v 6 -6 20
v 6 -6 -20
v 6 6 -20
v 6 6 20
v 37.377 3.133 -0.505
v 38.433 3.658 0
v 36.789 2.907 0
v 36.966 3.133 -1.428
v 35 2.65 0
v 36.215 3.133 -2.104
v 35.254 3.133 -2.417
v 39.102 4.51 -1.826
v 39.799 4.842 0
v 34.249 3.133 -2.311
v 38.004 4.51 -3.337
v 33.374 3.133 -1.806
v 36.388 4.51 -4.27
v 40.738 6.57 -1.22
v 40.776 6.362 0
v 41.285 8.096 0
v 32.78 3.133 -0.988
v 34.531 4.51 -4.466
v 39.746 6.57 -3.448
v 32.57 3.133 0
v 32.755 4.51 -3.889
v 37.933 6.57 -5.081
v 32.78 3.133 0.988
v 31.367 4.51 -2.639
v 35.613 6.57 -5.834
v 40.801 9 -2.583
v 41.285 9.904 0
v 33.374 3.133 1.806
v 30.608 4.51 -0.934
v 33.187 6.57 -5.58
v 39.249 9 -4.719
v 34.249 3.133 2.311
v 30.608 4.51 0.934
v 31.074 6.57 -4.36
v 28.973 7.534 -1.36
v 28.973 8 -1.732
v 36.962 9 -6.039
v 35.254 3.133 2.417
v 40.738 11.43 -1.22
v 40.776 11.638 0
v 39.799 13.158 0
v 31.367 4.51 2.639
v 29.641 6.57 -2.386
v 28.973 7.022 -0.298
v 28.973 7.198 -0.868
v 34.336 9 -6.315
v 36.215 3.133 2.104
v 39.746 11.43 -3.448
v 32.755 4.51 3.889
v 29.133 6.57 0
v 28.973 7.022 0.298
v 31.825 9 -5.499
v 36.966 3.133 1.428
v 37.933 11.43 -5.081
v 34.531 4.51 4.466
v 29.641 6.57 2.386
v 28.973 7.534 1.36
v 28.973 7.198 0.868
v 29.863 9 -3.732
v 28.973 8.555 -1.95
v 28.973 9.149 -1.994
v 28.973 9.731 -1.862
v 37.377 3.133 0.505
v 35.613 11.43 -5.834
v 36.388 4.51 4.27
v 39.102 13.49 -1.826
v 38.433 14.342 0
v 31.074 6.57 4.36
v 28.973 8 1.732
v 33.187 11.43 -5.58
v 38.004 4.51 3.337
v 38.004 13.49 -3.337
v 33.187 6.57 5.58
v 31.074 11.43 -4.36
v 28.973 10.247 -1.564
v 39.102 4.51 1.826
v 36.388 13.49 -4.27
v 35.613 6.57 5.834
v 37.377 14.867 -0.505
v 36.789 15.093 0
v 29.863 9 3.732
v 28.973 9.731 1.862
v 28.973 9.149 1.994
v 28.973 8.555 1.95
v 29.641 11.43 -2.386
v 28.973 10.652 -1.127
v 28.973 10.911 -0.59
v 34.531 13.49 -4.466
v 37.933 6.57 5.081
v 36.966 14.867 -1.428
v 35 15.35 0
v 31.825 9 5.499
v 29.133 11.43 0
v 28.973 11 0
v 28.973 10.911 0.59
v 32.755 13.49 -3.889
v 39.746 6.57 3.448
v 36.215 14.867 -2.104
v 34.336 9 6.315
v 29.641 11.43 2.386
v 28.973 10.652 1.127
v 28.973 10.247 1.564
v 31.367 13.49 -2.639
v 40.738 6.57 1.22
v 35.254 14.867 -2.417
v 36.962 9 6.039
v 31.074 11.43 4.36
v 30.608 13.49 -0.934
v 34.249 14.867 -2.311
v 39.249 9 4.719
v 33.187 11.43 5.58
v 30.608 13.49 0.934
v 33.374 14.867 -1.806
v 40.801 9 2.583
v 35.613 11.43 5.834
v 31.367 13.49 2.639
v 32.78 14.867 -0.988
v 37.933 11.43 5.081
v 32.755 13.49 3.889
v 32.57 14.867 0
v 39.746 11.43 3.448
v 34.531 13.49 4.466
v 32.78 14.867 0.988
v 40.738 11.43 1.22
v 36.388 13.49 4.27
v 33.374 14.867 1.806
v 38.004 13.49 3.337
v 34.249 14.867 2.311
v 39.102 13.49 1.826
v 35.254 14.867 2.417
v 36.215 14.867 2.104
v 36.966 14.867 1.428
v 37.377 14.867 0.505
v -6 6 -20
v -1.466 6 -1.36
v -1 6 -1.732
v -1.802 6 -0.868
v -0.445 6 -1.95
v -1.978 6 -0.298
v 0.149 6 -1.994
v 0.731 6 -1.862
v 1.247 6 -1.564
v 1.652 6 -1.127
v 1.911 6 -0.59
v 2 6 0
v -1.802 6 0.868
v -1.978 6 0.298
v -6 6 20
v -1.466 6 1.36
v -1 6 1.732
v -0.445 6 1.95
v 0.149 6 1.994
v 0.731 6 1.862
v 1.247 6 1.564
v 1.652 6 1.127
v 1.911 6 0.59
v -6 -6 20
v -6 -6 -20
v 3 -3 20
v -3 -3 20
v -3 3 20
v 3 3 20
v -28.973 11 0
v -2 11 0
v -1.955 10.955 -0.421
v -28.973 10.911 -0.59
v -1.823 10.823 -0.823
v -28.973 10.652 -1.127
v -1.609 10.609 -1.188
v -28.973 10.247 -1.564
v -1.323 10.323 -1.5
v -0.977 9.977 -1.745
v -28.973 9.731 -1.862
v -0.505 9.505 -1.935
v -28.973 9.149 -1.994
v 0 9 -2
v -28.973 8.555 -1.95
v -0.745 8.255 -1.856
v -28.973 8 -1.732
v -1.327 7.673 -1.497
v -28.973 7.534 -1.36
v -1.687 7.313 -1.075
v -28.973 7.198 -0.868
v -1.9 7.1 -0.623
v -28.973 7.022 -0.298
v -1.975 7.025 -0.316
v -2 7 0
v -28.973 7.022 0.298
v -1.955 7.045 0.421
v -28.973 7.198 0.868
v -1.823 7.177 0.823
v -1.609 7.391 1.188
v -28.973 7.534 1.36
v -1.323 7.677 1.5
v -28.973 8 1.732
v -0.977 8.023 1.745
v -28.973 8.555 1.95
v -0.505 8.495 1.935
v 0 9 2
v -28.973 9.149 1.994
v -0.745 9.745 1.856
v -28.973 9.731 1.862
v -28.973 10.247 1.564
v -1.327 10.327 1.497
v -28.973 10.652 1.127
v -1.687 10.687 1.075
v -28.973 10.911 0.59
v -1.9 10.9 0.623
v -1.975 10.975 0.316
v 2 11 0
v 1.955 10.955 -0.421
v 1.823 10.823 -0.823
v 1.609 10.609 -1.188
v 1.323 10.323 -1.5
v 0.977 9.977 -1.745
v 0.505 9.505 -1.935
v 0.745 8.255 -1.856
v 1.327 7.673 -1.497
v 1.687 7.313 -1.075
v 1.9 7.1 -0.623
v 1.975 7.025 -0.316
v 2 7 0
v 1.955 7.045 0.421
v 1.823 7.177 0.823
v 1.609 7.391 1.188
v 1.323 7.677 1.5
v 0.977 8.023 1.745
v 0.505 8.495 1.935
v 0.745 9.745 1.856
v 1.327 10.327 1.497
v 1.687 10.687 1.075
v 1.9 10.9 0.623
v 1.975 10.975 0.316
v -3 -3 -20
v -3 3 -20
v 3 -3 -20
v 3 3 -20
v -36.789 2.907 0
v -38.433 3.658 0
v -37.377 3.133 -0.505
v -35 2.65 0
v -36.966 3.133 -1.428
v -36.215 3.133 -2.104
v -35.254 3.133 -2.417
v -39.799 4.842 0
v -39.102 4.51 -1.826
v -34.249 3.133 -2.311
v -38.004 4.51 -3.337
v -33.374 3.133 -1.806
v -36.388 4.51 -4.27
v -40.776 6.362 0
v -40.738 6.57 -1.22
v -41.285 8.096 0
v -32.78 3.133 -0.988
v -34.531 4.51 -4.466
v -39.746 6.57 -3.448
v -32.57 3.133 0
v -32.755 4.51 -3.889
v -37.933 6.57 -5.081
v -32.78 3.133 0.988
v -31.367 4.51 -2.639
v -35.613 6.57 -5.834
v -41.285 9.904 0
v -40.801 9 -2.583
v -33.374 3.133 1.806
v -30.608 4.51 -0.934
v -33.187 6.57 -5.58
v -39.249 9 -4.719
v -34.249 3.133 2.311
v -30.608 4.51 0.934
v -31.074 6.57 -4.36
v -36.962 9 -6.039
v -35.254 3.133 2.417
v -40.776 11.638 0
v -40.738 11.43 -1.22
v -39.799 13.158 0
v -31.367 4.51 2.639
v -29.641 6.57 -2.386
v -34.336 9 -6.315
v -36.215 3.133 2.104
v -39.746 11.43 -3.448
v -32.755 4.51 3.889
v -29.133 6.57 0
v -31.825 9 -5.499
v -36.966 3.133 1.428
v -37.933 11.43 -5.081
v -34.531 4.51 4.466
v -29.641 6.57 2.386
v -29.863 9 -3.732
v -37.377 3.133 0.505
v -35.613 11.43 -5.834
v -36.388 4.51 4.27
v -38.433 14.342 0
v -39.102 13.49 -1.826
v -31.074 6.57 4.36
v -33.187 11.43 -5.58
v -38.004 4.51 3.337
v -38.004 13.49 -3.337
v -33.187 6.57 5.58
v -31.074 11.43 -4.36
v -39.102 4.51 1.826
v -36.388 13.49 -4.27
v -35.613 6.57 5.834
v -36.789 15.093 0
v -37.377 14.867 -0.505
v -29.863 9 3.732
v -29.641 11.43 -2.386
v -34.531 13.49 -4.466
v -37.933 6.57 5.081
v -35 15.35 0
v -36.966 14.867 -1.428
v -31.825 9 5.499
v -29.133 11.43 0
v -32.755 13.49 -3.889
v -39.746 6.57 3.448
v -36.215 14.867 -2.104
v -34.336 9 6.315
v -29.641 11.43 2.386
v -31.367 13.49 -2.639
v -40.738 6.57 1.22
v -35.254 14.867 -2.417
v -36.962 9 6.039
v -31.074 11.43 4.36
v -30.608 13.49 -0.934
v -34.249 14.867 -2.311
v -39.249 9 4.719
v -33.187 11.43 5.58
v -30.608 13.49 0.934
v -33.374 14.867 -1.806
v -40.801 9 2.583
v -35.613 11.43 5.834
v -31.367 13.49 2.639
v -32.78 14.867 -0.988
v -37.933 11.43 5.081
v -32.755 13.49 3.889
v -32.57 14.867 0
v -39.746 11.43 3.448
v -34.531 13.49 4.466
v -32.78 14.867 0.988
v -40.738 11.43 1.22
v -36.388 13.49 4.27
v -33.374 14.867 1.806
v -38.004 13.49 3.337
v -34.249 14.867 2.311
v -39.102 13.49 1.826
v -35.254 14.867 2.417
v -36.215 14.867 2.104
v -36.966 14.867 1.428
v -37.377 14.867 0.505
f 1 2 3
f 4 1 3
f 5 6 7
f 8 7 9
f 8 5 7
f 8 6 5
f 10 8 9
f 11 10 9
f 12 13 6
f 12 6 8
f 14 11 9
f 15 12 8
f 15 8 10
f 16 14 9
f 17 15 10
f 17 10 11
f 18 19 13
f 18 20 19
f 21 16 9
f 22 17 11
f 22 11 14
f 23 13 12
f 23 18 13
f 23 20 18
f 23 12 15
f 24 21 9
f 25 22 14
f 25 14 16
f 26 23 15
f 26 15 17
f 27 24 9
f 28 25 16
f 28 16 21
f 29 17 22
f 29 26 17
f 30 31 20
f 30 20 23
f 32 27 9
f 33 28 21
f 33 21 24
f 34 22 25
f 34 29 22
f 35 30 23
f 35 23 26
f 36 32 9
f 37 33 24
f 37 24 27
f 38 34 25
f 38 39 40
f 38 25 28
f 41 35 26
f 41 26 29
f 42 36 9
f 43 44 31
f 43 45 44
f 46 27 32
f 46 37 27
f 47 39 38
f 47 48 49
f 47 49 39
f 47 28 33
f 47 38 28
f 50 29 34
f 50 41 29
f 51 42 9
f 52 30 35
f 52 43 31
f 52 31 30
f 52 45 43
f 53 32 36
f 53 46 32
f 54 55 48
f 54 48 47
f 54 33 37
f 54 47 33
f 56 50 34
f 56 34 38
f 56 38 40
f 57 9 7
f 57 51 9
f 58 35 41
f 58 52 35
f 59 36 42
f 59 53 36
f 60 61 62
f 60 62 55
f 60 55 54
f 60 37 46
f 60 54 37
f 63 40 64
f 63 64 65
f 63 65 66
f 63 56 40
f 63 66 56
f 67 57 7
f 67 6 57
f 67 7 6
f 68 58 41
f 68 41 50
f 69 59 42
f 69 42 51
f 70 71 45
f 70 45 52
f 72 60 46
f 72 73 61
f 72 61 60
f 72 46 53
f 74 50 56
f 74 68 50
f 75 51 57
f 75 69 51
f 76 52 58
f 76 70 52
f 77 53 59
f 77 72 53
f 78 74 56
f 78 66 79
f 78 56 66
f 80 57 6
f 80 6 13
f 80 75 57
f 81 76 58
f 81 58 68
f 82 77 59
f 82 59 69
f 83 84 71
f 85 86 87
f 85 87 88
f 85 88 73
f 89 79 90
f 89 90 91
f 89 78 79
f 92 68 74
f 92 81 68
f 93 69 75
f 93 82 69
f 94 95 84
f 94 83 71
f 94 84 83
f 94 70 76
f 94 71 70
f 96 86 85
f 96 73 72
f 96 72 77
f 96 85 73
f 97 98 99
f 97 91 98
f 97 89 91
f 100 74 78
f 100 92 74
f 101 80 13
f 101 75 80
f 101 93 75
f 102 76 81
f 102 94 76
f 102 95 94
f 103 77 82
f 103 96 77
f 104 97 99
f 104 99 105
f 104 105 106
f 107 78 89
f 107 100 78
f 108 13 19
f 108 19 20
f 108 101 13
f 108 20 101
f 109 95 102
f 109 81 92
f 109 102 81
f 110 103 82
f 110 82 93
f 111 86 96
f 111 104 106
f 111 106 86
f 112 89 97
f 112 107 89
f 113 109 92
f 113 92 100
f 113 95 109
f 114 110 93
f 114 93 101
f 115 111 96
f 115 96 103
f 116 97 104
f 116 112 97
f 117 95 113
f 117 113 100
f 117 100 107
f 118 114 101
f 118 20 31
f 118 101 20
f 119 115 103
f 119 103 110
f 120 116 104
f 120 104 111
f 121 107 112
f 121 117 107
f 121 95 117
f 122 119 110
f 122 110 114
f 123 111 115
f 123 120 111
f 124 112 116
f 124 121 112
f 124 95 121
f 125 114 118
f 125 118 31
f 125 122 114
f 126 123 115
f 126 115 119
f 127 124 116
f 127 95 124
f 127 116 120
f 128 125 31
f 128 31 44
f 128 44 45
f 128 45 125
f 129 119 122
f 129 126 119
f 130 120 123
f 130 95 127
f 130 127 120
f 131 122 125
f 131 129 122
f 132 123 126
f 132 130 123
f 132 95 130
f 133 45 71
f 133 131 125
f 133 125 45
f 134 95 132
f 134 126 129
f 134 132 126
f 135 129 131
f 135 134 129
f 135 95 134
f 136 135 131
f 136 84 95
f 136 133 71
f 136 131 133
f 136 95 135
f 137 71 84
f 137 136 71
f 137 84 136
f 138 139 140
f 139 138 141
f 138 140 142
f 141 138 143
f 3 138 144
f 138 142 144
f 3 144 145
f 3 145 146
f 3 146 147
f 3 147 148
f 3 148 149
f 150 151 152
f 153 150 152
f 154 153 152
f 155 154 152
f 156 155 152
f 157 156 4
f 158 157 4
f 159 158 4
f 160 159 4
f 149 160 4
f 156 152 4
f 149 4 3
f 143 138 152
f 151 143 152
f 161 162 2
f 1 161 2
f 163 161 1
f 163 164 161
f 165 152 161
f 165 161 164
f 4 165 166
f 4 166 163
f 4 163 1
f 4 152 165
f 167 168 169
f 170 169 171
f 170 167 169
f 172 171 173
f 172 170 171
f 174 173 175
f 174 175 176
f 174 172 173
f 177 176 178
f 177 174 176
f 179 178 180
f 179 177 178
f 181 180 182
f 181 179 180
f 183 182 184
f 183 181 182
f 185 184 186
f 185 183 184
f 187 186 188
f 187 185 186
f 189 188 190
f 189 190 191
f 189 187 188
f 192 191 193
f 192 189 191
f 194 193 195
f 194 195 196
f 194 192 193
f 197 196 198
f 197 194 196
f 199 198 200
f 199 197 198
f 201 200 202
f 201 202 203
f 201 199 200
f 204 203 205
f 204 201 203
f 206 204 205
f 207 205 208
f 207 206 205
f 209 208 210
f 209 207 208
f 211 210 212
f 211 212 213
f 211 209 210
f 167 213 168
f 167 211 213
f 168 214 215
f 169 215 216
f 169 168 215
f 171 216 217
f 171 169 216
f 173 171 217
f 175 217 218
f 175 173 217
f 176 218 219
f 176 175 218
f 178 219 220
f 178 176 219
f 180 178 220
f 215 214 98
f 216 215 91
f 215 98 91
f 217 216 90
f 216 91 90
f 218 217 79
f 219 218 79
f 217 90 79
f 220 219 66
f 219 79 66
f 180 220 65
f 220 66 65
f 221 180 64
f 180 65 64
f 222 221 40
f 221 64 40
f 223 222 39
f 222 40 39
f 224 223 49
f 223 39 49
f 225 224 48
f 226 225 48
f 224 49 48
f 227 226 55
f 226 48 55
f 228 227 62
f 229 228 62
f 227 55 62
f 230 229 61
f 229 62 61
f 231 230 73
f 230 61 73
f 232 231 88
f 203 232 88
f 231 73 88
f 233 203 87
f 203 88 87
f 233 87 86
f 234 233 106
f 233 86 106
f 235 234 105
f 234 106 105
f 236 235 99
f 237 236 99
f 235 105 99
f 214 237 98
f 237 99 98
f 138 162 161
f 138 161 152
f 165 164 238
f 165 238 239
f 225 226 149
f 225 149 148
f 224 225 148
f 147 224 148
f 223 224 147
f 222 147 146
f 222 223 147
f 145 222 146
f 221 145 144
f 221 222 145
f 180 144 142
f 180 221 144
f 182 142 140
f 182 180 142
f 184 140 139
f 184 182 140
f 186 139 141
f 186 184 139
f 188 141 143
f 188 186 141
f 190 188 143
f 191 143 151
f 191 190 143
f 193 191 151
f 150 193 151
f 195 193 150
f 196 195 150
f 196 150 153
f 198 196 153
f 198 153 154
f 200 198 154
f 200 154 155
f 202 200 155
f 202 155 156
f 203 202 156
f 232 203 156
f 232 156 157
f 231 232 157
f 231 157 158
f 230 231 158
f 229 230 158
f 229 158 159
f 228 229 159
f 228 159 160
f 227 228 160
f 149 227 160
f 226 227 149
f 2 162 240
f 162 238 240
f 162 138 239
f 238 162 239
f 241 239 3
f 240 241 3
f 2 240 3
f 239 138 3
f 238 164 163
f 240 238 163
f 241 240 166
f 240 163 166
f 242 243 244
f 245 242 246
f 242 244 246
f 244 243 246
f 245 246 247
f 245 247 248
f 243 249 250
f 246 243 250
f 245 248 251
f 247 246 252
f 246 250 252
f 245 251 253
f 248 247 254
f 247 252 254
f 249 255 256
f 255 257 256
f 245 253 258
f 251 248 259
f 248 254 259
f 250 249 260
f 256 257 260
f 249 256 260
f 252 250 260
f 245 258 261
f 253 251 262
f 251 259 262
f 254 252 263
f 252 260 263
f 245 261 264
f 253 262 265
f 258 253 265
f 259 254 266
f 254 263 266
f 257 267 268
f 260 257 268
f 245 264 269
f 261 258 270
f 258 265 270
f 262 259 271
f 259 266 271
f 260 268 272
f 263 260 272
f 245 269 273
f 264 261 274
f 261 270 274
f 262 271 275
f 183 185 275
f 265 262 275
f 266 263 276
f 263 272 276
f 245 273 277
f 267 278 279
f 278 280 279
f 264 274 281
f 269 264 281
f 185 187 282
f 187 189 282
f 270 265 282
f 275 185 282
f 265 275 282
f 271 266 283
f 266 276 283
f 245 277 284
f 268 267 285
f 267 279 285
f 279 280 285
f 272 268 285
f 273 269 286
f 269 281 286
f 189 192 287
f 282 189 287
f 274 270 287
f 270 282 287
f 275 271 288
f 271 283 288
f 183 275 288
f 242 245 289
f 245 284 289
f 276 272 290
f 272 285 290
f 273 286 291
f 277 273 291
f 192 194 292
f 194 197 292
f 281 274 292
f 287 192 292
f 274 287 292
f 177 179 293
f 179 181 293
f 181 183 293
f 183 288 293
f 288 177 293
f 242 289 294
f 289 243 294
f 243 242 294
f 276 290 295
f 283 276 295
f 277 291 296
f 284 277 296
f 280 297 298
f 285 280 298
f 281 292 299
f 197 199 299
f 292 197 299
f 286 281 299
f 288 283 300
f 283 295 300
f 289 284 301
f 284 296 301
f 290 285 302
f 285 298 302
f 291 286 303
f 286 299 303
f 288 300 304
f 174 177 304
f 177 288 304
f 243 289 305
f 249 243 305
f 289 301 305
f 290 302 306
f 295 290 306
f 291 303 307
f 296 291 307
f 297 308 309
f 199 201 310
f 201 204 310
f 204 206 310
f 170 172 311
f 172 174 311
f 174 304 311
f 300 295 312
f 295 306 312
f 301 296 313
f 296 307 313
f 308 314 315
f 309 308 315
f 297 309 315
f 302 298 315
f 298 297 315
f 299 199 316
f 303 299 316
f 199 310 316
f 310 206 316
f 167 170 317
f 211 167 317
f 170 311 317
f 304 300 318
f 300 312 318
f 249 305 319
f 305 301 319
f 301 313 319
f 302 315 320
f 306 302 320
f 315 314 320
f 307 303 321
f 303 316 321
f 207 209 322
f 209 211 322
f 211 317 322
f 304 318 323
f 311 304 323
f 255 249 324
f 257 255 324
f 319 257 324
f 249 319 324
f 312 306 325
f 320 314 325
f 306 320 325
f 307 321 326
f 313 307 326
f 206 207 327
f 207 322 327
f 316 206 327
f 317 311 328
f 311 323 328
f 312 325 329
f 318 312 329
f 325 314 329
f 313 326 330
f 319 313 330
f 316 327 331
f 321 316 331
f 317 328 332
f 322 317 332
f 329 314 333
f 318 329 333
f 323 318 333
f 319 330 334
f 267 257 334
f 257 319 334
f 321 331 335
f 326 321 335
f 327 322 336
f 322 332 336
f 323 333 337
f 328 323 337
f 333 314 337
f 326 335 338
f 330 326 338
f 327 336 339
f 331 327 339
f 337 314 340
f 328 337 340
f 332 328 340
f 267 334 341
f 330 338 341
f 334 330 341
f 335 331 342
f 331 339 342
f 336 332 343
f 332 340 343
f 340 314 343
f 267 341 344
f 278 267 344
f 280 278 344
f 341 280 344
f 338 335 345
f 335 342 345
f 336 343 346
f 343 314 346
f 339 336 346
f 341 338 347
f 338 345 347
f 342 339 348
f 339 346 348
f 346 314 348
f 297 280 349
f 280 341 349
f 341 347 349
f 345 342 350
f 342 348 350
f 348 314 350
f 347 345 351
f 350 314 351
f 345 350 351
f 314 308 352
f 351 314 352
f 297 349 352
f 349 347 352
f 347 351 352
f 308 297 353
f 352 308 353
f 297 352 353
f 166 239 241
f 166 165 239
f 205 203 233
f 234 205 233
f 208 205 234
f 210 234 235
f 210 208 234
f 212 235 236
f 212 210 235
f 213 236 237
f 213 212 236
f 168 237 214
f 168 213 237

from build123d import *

# Parameters (mm, degrees)
ESQUISSE1_W        = 12
ESQUISSE1_H        = 12
ESQUISSE1_W_2      = 6
ESQUISSE1_H_2      = 6
BOSS_EXTRU_1_DEPTH = 20
ESQUISSE2_R        = 2


with BuildPart() as part:
    # Esquisse1 → Boss.-Extru.1 (new, symmetric)
    with BuildSketch(Plane.XY):
        Rectangle(ESQUISSE1_W, ESQUISSE1_H)
        Rectangle(ESQUISSE1_W_2, ESQUISSE1_H_2, mode=Mode.SUBTRACT)
    extrude(amount=BOSS_EXTRU_1_DEPTH, both=True)

    # Balayage1: sweep along a curve in space
    with BuildLine() as balayage1_path:
        Line((0, 6, 0), (0, 9, 0))
        Line((0, 9, 0), (-35, 9, 0))
    # Esquisse2 → Balayage1 (sweep)
    with BuildSketch(Plane(origin=(0, 6, 0), x_dir=(1, 0, 0), z_dir=(0, 1, 0))):
        Circle(ESQUISSE2_R)
    balayage1 = sweep(path=balayage1_path.line, transition=Transition.RIGHT)

    # Esquisse3 → Révolution1 (revolve)
    with BuildSketch(Plane.XY):
        with BuildLine():
            Line((-35, 15.35), (-35, 2.65))
            ThreePointArc((-35, 2.65), (-41.35, 9), (-35, 15.35))
        make_face()
    r_volution1 = revolve(axis=Axis((-35, 15.35, 0), (0, -1, 0)))

    # Symétrie1: Balayage1, Révolution1 across plane
    add(balayage1.mirror(Plane(origin=(0, 0, 0), x_dir=(0, 0, 1), z_dir=(1, 0, 0))))
    add(r_volution1.mirror(Plane(origin=(0, 0, 0), x_dir=(0, 0, 1), z_dir=(1, 0, 0))))


solid = part.part
